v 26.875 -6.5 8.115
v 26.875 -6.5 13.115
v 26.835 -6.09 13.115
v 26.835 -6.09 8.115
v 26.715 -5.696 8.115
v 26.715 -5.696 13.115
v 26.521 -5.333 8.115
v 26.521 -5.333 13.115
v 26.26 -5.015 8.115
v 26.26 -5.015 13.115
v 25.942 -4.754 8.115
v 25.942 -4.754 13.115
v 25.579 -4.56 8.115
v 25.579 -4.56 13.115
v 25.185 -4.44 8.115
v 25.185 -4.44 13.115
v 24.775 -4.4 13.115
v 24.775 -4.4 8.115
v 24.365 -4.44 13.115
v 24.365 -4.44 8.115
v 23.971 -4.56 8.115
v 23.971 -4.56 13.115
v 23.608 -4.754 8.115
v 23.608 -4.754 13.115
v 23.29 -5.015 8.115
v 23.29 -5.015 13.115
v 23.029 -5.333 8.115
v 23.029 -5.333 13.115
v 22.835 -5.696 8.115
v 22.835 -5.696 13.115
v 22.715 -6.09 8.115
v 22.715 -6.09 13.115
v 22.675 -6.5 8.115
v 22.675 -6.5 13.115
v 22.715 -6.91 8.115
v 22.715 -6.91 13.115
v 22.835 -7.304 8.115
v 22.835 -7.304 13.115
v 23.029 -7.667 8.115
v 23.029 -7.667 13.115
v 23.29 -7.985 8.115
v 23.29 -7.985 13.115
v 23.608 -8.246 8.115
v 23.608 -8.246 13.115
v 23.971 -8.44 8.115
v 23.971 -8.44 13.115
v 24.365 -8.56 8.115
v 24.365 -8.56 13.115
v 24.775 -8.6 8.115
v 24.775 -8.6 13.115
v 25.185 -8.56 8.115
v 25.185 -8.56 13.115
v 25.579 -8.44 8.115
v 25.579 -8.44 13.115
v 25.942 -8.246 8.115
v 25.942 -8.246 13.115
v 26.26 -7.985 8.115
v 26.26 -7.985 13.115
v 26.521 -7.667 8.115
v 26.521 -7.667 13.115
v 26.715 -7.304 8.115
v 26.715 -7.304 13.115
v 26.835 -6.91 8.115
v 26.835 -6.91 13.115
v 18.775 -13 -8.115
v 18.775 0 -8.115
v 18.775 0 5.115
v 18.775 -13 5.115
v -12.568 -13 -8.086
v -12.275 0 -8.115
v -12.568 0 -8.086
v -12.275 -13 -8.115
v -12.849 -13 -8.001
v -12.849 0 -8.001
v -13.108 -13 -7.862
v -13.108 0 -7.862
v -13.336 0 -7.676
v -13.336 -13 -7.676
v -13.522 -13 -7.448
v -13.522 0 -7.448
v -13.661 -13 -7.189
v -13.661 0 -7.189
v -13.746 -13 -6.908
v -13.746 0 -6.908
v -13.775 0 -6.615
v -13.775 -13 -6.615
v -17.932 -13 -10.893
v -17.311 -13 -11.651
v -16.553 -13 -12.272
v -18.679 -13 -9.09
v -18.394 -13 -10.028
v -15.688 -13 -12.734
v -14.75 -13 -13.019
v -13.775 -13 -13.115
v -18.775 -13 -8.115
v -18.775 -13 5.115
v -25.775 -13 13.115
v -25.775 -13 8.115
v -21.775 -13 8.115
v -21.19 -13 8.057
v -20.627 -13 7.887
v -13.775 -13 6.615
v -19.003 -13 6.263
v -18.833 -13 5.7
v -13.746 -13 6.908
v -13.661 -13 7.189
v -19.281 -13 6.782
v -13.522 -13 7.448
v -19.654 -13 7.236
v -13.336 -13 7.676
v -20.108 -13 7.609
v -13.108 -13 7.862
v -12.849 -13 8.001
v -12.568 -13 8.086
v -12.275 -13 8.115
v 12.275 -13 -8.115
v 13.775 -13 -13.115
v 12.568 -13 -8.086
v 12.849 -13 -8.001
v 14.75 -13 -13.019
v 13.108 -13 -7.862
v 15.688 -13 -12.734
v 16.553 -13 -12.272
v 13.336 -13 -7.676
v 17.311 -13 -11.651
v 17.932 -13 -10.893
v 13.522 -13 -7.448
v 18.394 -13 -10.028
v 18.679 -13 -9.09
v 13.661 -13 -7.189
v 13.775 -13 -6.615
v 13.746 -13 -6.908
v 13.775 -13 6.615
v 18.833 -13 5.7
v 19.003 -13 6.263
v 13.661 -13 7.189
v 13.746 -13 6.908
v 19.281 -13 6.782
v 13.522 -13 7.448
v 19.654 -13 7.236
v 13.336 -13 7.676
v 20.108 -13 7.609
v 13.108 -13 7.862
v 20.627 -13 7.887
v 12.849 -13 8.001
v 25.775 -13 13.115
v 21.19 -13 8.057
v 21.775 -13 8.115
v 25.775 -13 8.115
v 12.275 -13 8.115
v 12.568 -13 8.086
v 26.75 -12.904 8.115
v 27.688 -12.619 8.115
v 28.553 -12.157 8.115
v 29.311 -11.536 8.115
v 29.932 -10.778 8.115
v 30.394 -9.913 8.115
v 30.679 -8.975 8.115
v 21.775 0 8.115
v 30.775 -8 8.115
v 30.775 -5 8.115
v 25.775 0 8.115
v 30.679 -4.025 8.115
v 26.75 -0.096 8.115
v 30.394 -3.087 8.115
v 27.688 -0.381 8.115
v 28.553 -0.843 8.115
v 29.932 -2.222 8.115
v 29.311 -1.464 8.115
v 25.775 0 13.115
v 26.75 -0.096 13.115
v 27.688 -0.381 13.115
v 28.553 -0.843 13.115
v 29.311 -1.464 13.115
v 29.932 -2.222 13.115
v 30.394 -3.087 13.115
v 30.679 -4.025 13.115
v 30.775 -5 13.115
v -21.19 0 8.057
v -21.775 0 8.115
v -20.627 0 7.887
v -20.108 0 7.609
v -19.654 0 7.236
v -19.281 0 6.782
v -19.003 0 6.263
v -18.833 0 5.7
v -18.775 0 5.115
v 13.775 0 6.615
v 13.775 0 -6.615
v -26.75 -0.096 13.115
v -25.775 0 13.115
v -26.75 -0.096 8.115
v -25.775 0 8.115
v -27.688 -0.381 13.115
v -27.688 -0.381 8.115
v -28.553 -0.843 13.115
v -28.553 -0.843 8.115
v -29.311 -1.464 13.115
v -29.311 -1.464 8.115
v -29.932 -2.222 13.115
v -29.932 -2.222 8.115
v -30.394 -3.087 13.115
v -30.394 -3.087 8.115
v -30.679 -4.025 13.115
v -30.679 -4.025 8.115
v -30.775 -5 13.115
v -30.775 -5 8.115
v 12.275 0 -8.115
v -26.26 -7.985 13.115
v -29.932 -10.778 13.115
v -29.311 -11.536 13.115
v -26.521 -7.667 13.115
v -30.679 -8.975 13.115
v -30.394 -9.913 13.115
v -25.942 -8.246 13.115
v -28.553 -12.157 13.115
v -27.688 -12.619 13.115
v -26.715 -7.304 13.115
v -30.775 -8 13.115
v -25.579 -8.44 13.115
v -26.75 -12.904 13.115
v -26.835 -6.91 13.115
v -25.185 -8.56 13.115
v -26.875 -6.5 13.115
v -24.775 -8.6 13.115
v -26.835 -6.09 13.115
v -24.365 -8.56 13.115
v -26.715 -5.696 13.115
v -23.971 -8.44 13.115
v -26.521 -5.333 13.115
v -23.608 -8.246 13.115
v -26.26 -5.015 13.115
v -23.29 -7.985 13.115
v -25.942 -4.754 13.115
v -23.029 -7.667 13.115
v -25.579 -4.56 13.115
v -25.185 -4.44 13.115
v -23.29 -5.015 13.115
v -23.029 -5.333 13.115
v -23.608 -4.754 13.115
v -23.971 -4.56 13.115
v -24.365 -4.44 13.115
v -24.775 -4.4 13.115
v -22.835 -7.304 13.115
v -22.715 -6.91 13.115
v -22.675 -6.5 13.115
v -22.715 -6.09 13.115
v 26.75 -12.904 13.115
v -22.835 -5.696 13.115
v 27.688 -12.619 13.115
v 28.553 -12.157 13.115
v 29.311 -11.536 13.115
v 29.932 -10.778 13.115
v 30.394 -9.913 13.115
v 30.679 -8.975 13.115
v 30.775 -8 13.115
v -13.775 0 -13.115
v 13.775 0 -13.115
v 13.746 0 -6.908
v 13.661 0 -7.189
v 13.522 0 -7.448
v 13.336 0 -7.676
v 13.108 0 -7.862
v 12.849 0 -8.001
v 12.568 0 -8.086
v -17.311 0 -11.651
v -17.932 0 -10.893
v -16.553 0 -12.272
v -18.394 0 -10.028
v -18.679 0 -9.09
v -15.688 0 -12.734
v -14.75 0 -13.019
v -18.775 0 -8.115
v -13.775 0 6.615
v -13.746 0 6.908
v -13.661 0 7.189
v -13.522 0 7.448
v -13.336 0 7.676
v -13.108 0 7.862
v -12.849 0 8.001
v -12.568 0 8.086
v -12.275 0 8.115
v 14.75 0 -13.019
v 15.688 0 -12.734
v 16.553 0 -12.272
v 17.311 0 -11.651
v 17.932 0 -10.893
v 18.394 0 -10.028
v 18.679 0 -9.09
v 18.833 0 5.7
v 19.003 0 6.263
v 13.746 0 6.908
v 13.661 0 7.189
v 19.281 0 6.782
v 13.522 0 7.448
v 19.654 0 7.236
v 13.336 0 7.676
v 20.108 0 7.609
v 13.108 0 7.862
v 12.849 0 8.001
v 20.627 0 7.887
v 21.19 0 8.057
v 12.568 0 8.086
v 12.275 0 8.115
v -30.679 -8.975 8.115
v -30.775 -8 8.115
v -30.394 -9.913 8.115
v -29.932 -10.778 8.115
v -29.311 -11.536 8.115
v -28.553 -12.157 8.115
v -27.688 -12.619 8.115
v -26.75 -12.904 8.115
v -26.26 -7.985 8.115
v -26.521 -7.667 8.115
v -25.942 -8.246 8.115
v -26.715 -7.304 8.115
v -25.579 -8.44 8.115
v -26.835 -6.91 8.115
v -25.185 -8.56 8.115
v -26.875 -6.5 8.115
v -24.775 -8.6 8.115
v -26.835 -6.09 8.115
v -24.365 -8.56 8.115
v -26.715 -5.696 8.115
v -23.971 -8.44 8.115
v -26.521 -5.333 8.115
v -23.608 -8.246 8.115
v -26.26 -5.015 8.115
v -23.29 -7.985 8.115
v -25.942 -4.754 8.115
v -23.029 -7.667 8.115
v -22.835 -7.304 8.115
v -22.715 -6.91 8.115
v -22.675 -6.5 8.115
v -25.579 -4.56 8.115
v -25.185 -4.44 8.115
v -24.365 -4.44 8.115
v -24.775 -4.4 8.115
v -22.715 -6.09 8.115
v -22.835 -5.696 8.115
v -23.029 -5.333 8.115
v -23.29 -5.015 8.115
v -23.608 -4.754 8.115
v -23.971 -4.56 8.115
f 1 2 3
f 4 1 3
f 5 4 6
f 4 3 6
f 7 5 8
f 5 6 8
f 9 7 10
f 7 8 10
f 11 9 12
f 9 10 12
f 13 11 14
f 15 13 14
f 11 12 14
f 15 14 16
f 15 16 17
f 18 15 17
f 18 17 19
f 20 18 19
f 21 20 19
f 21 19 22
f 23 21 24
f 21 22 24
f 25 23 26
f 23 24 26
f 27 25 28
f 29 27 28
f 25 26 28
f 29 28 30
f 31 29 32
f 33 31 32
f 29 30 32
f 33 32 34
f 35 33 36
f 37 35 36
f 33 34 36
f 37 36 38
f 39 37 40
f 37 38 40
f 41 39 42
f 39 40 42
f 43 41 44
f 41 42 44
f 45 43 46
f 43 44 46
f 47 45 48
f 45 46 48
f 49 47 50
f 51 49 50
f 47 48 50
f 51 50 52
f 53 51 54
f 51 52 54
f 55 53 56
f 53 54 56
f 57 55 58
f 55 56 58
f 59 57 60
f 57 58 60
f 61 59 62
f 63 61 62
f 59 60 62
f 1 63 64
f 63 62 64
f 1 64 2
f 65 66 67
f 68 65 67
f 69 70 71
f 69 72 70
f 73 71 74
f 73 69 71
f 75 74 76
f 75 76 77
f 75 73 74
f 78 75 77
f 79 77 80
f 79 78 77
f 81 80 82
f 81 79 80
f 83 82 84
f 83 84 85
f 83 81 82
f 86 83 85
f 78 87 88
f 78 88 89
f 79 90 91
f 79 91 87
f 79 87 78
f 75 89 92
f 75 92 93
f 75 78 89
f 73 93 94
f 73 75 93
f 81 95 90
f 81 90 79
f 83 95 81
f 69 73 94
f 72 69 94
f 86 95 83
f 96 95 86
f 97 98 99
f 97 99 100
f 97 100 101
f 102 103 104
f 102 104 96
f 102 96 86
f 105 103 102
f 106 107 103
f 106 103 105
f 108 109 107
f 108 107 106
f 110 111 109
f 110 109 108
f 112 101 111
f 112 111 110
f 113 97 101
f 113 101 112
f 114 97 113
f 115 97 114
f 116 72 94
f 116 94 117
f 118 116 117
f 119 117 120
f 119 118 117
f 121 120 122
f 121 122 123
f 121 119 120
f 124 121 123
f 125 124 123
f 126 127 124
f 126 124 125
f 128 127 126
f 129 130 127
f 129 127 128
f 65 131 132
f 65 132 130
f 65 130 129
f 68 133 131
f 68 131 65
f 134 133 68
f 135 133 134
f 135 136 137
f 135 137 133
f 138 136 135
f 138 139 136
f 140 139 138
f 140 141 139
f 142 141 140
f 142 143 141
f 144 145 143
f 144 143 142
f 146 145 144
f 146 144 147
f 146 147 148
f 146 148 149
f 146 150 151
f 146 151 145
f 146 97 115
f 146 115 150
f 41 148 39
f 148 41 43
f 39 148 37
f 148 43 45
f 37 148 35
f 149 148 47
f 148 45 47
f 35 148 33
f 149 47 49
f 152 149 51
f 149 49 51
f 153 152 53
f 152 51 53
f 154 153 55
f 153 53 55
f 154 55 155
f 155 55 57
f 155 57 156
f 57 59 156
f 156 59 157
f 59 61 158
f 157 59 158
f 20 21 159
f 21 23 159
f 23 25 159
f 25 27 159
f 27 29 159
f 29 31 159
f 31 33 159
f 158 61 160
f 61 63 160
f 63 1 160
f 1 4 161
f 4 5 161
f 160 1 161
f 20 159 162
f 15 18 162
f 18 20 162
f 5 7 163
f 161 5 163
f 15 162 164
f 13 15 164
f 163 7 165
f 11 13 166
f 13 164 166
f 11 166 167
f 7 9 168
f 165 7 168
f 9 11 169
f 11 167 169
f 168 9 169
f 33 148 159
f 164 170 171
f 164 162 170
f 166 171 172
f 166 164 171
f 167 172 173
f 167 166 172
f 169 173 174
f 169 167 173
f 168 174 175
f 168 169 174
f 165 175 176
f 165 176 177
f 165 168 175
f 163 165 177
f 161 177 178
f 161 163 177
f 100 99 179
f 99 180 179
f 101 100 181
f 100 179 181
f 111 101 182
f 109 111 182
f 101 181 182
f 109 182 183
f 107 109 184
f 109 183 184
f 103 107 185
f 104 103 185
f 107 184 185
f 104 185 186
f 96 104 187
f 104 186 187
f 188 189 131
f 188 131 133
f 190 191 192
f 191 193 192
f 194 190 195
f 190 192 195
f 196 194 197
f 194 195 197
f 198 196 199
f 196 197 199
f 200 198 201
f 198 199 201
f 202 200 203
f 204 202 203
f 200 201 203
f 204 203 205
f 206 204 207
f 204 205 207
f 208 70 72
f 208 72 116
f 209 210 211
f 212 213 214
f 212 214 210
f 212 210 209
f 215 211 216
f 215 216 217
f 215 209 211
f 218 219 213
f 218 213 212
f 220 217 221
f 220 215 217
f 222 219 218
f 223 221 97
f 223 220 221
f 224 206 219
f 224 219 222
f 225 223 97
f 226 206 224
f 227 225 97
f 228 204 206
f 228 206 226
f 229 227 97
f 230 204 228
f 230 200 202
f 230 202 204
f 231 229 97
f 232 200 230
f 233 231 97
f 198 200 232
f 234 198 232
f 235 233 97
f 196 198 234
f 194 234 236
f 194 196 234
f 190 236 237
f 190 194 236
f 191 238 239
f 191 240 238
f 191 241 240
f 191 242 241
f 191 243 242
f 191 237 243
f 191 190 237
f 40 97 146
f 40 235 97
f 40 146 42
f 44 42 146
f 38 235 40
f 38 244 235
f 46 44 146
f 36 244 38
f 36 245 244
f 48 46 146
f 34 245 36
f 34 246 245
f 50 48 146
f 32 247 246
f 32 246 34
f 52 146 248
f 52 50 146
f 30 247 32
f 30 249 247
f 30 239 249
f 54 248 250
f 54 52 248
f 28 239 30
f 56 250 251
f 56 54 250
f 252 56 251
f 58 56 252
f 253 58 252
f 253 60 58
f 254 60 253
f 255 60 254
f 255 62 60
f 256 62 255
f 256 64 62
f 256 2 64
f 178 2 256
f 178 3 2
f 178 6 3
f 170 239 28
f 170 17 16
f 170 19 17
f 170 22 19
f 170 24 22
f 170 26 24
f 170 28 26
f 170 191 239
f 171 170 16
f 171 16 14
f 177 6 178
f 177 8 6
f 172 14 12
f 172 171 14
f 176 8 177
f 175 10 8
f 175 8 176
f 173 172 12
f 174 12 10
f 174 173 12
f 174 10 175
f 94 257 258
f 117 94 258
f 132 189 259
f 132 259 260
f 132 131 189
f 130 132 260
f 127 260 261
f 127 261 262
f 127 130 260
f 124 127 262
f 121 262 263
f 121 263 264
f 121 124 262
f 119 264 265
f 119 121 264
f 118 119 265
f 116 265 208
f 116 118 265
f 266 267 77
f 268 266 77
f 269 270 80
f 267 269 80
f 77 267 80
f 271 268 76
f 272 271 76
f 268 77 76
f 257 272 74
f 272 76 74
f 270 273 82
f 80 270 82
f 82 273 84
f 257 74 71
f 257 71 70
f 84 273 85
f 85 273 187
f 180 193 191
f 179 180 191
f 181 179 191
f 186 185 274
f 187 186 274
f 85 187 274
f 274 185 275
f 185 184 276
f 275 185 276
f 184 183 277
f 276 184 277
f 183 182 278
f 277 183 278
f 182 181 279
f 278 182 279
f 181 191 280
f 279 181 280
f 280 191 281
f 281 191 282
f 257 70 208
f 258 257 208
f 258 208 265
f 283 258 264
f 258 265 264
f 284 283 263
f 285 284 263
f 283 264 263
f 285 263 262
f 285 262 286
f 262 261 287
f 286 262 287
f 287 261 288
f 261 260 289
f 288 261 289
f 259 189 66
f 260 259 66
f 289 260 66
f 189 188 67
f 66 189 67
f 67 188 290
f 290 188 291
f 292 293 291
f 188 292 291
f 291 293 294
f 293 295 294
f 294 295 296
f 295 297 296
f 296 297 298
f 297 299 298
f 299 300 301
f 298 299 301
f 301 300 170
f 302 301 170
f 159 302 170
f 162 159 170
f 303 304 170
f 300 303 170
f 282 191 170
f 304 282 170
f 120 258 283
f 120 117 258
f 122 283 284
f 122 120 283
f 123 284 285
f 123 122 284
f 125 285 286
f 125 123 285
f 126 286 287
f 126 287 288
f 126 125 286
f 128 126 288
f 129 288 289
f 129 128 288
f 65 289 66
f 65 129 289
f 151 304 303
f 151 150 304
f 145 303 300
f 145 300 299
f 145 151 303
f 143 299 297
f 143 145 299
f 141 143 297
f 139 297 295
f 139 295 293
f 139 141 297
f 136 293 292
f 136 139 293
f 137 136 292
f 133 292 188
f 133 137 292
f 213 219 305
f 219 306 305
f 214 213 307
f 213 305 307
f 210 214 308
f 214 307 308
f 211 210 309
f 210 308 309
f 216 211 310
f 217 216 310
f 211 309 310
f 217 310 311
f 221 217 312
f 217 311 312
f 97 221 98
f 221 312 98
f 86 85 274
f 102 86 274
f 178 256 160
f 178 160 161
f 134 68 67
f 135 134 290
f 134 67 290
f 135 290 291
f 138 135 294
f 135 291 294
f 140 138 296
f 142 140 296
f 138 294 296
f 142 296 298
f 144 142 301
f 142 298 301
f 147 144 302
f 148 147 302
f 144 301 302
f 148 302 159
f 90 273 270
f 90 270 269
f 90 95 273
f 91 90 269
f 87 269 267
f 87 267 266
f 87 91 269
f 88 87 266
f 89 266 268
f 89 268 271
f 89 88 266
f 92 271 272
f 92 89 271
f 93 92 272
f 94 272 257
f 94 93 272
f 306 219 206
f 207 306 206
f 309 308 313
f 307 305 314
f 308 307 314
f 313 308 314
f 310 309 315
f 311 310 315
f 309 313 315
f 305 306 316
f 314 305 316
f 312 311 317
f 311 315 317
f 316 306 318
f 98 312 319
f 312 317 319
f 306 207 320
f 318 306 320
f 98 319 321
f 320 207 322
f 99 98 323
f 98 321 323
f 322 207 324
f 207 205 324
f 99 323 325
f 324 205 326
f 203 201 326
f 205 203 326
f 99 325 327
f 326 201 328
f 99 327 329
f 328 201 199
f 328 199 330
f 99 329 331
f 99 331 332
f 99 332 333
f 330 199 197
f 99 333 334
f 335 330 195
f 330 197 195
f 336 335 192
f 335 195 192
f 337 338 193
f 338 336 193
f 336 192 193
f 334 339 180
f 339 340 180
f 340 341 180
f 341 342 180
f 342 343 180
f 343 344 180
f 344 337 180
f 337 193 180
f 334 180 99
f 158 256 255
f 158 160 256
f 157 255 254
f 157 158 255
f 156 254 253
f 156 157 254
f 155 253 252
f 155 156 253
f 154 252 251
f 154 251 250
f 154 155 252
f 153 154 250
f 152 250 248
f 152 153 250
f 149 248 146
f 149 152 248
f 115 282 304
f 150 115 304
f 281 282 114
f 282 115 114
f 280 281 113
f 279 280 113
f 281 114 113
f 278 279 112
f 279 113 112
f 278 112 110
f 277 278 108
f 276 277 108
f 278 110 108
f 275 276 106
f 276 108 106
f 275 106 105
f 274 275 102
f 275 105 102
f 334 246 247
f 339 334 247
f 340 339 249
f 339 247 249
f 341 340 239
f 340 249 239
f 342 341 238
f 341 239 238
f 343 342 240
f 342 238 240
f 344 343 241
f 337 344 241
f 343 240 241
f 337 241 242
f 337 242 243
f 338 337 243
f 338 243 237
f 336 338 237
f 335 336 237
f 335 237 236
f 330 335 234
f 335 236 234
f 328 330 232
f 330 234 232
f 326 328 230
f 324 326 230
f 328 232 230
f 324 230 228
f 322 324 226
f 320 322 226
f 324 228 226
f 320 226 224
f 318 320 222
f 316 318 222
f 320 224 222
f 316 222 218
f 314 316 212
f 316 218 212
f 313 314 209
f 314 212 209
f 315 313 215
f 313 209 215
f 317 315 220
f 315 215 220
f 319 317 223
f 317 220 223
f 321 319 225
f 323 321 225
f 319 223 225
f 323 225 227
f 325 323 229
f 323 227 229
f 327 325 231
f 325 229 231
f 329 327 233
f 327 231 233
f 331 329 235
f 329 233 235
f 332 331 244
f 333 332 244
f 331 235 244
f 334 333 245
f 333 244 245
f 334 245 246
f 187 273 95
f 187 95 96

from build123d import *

# Parameters (mm, degrees)
F0_W     = 37.55
F0_H     = 26.23
F0_W_2   = 27.55
F0_H_2   = 16.23
F1_DEPTH = 13
F2_W     = 61.55
F2_H     = 13
F2_R     = 2.1
F3_DEPTH = 5
F4_R     = 3
F5_R     = 1.5
F6_R     = 5
F7_R     = 5


with BuildPart() as f1:
    # F0 (on Front) → F1 (new body)
    with BuildSketch(Plane.XZ):
        Rectangle(F0_W, F0_H)
        Rectangle(F0_W_2, F0_H_2, mode=Mode.SUBTRACT)
    extrude(amount=F1_DEPTH)

    # F2 (on face) → F3 (join)
    with BuildSketch(Plane.XY.offset(13.115)):
        with Locations((0, -6.5)):
            Rectangle(F2_W, F2_H)
        with Locations((-24.775, -6.5)):
            Circle(F2_R, mode=Mode.SUBTRACT)
        with Locations((24.775, -6.5)):
            Circle(F2_R, mode=Mode.SUBTRACT)
    extrude(amount=-F3_DEPTH)

    # F4
    f4_edges = [f1.edges().sort_by_distance(p)[0] for p in [
        (-18.775, -6.5, 8.115),
        (18.775, -6.5, 8.115),
    ]]
    fillet(f4_edges, radius=F4_R)

    # F5
    f5_edges = [f1.edges().sort_by_distance(p)[0] for p in [
        (-13.775, -6.5, 8.115),
        (13.775, -6.5, 8.115),
        (13.775, -6.5, -8.115),
        (-13.775, -6.5, -8.115),
    ]]
    fillet(f5_edges, radius=F5_R)

    # F6
    f6_edges = [f1.edges().sort_by_distance(p)[0] for p in [
        (18.775, -6.5, -13.115),
        (-18.775, -6.5, -13.115),
    ]]
    fillet(f6_edges, radius=F6_R)

    # F7
    f7_edges = [f1.edges().sort_by_distance(p)[0] for p in [
        (30.775, -13, 10.615),
        (30.775, 0, 10.615),
        (-30.775, -13, 10.615),
        (-30.775, 0, 10.615),
    ]]
    fillet(f7_edges, radius=F7_R)


solid = f1.part
